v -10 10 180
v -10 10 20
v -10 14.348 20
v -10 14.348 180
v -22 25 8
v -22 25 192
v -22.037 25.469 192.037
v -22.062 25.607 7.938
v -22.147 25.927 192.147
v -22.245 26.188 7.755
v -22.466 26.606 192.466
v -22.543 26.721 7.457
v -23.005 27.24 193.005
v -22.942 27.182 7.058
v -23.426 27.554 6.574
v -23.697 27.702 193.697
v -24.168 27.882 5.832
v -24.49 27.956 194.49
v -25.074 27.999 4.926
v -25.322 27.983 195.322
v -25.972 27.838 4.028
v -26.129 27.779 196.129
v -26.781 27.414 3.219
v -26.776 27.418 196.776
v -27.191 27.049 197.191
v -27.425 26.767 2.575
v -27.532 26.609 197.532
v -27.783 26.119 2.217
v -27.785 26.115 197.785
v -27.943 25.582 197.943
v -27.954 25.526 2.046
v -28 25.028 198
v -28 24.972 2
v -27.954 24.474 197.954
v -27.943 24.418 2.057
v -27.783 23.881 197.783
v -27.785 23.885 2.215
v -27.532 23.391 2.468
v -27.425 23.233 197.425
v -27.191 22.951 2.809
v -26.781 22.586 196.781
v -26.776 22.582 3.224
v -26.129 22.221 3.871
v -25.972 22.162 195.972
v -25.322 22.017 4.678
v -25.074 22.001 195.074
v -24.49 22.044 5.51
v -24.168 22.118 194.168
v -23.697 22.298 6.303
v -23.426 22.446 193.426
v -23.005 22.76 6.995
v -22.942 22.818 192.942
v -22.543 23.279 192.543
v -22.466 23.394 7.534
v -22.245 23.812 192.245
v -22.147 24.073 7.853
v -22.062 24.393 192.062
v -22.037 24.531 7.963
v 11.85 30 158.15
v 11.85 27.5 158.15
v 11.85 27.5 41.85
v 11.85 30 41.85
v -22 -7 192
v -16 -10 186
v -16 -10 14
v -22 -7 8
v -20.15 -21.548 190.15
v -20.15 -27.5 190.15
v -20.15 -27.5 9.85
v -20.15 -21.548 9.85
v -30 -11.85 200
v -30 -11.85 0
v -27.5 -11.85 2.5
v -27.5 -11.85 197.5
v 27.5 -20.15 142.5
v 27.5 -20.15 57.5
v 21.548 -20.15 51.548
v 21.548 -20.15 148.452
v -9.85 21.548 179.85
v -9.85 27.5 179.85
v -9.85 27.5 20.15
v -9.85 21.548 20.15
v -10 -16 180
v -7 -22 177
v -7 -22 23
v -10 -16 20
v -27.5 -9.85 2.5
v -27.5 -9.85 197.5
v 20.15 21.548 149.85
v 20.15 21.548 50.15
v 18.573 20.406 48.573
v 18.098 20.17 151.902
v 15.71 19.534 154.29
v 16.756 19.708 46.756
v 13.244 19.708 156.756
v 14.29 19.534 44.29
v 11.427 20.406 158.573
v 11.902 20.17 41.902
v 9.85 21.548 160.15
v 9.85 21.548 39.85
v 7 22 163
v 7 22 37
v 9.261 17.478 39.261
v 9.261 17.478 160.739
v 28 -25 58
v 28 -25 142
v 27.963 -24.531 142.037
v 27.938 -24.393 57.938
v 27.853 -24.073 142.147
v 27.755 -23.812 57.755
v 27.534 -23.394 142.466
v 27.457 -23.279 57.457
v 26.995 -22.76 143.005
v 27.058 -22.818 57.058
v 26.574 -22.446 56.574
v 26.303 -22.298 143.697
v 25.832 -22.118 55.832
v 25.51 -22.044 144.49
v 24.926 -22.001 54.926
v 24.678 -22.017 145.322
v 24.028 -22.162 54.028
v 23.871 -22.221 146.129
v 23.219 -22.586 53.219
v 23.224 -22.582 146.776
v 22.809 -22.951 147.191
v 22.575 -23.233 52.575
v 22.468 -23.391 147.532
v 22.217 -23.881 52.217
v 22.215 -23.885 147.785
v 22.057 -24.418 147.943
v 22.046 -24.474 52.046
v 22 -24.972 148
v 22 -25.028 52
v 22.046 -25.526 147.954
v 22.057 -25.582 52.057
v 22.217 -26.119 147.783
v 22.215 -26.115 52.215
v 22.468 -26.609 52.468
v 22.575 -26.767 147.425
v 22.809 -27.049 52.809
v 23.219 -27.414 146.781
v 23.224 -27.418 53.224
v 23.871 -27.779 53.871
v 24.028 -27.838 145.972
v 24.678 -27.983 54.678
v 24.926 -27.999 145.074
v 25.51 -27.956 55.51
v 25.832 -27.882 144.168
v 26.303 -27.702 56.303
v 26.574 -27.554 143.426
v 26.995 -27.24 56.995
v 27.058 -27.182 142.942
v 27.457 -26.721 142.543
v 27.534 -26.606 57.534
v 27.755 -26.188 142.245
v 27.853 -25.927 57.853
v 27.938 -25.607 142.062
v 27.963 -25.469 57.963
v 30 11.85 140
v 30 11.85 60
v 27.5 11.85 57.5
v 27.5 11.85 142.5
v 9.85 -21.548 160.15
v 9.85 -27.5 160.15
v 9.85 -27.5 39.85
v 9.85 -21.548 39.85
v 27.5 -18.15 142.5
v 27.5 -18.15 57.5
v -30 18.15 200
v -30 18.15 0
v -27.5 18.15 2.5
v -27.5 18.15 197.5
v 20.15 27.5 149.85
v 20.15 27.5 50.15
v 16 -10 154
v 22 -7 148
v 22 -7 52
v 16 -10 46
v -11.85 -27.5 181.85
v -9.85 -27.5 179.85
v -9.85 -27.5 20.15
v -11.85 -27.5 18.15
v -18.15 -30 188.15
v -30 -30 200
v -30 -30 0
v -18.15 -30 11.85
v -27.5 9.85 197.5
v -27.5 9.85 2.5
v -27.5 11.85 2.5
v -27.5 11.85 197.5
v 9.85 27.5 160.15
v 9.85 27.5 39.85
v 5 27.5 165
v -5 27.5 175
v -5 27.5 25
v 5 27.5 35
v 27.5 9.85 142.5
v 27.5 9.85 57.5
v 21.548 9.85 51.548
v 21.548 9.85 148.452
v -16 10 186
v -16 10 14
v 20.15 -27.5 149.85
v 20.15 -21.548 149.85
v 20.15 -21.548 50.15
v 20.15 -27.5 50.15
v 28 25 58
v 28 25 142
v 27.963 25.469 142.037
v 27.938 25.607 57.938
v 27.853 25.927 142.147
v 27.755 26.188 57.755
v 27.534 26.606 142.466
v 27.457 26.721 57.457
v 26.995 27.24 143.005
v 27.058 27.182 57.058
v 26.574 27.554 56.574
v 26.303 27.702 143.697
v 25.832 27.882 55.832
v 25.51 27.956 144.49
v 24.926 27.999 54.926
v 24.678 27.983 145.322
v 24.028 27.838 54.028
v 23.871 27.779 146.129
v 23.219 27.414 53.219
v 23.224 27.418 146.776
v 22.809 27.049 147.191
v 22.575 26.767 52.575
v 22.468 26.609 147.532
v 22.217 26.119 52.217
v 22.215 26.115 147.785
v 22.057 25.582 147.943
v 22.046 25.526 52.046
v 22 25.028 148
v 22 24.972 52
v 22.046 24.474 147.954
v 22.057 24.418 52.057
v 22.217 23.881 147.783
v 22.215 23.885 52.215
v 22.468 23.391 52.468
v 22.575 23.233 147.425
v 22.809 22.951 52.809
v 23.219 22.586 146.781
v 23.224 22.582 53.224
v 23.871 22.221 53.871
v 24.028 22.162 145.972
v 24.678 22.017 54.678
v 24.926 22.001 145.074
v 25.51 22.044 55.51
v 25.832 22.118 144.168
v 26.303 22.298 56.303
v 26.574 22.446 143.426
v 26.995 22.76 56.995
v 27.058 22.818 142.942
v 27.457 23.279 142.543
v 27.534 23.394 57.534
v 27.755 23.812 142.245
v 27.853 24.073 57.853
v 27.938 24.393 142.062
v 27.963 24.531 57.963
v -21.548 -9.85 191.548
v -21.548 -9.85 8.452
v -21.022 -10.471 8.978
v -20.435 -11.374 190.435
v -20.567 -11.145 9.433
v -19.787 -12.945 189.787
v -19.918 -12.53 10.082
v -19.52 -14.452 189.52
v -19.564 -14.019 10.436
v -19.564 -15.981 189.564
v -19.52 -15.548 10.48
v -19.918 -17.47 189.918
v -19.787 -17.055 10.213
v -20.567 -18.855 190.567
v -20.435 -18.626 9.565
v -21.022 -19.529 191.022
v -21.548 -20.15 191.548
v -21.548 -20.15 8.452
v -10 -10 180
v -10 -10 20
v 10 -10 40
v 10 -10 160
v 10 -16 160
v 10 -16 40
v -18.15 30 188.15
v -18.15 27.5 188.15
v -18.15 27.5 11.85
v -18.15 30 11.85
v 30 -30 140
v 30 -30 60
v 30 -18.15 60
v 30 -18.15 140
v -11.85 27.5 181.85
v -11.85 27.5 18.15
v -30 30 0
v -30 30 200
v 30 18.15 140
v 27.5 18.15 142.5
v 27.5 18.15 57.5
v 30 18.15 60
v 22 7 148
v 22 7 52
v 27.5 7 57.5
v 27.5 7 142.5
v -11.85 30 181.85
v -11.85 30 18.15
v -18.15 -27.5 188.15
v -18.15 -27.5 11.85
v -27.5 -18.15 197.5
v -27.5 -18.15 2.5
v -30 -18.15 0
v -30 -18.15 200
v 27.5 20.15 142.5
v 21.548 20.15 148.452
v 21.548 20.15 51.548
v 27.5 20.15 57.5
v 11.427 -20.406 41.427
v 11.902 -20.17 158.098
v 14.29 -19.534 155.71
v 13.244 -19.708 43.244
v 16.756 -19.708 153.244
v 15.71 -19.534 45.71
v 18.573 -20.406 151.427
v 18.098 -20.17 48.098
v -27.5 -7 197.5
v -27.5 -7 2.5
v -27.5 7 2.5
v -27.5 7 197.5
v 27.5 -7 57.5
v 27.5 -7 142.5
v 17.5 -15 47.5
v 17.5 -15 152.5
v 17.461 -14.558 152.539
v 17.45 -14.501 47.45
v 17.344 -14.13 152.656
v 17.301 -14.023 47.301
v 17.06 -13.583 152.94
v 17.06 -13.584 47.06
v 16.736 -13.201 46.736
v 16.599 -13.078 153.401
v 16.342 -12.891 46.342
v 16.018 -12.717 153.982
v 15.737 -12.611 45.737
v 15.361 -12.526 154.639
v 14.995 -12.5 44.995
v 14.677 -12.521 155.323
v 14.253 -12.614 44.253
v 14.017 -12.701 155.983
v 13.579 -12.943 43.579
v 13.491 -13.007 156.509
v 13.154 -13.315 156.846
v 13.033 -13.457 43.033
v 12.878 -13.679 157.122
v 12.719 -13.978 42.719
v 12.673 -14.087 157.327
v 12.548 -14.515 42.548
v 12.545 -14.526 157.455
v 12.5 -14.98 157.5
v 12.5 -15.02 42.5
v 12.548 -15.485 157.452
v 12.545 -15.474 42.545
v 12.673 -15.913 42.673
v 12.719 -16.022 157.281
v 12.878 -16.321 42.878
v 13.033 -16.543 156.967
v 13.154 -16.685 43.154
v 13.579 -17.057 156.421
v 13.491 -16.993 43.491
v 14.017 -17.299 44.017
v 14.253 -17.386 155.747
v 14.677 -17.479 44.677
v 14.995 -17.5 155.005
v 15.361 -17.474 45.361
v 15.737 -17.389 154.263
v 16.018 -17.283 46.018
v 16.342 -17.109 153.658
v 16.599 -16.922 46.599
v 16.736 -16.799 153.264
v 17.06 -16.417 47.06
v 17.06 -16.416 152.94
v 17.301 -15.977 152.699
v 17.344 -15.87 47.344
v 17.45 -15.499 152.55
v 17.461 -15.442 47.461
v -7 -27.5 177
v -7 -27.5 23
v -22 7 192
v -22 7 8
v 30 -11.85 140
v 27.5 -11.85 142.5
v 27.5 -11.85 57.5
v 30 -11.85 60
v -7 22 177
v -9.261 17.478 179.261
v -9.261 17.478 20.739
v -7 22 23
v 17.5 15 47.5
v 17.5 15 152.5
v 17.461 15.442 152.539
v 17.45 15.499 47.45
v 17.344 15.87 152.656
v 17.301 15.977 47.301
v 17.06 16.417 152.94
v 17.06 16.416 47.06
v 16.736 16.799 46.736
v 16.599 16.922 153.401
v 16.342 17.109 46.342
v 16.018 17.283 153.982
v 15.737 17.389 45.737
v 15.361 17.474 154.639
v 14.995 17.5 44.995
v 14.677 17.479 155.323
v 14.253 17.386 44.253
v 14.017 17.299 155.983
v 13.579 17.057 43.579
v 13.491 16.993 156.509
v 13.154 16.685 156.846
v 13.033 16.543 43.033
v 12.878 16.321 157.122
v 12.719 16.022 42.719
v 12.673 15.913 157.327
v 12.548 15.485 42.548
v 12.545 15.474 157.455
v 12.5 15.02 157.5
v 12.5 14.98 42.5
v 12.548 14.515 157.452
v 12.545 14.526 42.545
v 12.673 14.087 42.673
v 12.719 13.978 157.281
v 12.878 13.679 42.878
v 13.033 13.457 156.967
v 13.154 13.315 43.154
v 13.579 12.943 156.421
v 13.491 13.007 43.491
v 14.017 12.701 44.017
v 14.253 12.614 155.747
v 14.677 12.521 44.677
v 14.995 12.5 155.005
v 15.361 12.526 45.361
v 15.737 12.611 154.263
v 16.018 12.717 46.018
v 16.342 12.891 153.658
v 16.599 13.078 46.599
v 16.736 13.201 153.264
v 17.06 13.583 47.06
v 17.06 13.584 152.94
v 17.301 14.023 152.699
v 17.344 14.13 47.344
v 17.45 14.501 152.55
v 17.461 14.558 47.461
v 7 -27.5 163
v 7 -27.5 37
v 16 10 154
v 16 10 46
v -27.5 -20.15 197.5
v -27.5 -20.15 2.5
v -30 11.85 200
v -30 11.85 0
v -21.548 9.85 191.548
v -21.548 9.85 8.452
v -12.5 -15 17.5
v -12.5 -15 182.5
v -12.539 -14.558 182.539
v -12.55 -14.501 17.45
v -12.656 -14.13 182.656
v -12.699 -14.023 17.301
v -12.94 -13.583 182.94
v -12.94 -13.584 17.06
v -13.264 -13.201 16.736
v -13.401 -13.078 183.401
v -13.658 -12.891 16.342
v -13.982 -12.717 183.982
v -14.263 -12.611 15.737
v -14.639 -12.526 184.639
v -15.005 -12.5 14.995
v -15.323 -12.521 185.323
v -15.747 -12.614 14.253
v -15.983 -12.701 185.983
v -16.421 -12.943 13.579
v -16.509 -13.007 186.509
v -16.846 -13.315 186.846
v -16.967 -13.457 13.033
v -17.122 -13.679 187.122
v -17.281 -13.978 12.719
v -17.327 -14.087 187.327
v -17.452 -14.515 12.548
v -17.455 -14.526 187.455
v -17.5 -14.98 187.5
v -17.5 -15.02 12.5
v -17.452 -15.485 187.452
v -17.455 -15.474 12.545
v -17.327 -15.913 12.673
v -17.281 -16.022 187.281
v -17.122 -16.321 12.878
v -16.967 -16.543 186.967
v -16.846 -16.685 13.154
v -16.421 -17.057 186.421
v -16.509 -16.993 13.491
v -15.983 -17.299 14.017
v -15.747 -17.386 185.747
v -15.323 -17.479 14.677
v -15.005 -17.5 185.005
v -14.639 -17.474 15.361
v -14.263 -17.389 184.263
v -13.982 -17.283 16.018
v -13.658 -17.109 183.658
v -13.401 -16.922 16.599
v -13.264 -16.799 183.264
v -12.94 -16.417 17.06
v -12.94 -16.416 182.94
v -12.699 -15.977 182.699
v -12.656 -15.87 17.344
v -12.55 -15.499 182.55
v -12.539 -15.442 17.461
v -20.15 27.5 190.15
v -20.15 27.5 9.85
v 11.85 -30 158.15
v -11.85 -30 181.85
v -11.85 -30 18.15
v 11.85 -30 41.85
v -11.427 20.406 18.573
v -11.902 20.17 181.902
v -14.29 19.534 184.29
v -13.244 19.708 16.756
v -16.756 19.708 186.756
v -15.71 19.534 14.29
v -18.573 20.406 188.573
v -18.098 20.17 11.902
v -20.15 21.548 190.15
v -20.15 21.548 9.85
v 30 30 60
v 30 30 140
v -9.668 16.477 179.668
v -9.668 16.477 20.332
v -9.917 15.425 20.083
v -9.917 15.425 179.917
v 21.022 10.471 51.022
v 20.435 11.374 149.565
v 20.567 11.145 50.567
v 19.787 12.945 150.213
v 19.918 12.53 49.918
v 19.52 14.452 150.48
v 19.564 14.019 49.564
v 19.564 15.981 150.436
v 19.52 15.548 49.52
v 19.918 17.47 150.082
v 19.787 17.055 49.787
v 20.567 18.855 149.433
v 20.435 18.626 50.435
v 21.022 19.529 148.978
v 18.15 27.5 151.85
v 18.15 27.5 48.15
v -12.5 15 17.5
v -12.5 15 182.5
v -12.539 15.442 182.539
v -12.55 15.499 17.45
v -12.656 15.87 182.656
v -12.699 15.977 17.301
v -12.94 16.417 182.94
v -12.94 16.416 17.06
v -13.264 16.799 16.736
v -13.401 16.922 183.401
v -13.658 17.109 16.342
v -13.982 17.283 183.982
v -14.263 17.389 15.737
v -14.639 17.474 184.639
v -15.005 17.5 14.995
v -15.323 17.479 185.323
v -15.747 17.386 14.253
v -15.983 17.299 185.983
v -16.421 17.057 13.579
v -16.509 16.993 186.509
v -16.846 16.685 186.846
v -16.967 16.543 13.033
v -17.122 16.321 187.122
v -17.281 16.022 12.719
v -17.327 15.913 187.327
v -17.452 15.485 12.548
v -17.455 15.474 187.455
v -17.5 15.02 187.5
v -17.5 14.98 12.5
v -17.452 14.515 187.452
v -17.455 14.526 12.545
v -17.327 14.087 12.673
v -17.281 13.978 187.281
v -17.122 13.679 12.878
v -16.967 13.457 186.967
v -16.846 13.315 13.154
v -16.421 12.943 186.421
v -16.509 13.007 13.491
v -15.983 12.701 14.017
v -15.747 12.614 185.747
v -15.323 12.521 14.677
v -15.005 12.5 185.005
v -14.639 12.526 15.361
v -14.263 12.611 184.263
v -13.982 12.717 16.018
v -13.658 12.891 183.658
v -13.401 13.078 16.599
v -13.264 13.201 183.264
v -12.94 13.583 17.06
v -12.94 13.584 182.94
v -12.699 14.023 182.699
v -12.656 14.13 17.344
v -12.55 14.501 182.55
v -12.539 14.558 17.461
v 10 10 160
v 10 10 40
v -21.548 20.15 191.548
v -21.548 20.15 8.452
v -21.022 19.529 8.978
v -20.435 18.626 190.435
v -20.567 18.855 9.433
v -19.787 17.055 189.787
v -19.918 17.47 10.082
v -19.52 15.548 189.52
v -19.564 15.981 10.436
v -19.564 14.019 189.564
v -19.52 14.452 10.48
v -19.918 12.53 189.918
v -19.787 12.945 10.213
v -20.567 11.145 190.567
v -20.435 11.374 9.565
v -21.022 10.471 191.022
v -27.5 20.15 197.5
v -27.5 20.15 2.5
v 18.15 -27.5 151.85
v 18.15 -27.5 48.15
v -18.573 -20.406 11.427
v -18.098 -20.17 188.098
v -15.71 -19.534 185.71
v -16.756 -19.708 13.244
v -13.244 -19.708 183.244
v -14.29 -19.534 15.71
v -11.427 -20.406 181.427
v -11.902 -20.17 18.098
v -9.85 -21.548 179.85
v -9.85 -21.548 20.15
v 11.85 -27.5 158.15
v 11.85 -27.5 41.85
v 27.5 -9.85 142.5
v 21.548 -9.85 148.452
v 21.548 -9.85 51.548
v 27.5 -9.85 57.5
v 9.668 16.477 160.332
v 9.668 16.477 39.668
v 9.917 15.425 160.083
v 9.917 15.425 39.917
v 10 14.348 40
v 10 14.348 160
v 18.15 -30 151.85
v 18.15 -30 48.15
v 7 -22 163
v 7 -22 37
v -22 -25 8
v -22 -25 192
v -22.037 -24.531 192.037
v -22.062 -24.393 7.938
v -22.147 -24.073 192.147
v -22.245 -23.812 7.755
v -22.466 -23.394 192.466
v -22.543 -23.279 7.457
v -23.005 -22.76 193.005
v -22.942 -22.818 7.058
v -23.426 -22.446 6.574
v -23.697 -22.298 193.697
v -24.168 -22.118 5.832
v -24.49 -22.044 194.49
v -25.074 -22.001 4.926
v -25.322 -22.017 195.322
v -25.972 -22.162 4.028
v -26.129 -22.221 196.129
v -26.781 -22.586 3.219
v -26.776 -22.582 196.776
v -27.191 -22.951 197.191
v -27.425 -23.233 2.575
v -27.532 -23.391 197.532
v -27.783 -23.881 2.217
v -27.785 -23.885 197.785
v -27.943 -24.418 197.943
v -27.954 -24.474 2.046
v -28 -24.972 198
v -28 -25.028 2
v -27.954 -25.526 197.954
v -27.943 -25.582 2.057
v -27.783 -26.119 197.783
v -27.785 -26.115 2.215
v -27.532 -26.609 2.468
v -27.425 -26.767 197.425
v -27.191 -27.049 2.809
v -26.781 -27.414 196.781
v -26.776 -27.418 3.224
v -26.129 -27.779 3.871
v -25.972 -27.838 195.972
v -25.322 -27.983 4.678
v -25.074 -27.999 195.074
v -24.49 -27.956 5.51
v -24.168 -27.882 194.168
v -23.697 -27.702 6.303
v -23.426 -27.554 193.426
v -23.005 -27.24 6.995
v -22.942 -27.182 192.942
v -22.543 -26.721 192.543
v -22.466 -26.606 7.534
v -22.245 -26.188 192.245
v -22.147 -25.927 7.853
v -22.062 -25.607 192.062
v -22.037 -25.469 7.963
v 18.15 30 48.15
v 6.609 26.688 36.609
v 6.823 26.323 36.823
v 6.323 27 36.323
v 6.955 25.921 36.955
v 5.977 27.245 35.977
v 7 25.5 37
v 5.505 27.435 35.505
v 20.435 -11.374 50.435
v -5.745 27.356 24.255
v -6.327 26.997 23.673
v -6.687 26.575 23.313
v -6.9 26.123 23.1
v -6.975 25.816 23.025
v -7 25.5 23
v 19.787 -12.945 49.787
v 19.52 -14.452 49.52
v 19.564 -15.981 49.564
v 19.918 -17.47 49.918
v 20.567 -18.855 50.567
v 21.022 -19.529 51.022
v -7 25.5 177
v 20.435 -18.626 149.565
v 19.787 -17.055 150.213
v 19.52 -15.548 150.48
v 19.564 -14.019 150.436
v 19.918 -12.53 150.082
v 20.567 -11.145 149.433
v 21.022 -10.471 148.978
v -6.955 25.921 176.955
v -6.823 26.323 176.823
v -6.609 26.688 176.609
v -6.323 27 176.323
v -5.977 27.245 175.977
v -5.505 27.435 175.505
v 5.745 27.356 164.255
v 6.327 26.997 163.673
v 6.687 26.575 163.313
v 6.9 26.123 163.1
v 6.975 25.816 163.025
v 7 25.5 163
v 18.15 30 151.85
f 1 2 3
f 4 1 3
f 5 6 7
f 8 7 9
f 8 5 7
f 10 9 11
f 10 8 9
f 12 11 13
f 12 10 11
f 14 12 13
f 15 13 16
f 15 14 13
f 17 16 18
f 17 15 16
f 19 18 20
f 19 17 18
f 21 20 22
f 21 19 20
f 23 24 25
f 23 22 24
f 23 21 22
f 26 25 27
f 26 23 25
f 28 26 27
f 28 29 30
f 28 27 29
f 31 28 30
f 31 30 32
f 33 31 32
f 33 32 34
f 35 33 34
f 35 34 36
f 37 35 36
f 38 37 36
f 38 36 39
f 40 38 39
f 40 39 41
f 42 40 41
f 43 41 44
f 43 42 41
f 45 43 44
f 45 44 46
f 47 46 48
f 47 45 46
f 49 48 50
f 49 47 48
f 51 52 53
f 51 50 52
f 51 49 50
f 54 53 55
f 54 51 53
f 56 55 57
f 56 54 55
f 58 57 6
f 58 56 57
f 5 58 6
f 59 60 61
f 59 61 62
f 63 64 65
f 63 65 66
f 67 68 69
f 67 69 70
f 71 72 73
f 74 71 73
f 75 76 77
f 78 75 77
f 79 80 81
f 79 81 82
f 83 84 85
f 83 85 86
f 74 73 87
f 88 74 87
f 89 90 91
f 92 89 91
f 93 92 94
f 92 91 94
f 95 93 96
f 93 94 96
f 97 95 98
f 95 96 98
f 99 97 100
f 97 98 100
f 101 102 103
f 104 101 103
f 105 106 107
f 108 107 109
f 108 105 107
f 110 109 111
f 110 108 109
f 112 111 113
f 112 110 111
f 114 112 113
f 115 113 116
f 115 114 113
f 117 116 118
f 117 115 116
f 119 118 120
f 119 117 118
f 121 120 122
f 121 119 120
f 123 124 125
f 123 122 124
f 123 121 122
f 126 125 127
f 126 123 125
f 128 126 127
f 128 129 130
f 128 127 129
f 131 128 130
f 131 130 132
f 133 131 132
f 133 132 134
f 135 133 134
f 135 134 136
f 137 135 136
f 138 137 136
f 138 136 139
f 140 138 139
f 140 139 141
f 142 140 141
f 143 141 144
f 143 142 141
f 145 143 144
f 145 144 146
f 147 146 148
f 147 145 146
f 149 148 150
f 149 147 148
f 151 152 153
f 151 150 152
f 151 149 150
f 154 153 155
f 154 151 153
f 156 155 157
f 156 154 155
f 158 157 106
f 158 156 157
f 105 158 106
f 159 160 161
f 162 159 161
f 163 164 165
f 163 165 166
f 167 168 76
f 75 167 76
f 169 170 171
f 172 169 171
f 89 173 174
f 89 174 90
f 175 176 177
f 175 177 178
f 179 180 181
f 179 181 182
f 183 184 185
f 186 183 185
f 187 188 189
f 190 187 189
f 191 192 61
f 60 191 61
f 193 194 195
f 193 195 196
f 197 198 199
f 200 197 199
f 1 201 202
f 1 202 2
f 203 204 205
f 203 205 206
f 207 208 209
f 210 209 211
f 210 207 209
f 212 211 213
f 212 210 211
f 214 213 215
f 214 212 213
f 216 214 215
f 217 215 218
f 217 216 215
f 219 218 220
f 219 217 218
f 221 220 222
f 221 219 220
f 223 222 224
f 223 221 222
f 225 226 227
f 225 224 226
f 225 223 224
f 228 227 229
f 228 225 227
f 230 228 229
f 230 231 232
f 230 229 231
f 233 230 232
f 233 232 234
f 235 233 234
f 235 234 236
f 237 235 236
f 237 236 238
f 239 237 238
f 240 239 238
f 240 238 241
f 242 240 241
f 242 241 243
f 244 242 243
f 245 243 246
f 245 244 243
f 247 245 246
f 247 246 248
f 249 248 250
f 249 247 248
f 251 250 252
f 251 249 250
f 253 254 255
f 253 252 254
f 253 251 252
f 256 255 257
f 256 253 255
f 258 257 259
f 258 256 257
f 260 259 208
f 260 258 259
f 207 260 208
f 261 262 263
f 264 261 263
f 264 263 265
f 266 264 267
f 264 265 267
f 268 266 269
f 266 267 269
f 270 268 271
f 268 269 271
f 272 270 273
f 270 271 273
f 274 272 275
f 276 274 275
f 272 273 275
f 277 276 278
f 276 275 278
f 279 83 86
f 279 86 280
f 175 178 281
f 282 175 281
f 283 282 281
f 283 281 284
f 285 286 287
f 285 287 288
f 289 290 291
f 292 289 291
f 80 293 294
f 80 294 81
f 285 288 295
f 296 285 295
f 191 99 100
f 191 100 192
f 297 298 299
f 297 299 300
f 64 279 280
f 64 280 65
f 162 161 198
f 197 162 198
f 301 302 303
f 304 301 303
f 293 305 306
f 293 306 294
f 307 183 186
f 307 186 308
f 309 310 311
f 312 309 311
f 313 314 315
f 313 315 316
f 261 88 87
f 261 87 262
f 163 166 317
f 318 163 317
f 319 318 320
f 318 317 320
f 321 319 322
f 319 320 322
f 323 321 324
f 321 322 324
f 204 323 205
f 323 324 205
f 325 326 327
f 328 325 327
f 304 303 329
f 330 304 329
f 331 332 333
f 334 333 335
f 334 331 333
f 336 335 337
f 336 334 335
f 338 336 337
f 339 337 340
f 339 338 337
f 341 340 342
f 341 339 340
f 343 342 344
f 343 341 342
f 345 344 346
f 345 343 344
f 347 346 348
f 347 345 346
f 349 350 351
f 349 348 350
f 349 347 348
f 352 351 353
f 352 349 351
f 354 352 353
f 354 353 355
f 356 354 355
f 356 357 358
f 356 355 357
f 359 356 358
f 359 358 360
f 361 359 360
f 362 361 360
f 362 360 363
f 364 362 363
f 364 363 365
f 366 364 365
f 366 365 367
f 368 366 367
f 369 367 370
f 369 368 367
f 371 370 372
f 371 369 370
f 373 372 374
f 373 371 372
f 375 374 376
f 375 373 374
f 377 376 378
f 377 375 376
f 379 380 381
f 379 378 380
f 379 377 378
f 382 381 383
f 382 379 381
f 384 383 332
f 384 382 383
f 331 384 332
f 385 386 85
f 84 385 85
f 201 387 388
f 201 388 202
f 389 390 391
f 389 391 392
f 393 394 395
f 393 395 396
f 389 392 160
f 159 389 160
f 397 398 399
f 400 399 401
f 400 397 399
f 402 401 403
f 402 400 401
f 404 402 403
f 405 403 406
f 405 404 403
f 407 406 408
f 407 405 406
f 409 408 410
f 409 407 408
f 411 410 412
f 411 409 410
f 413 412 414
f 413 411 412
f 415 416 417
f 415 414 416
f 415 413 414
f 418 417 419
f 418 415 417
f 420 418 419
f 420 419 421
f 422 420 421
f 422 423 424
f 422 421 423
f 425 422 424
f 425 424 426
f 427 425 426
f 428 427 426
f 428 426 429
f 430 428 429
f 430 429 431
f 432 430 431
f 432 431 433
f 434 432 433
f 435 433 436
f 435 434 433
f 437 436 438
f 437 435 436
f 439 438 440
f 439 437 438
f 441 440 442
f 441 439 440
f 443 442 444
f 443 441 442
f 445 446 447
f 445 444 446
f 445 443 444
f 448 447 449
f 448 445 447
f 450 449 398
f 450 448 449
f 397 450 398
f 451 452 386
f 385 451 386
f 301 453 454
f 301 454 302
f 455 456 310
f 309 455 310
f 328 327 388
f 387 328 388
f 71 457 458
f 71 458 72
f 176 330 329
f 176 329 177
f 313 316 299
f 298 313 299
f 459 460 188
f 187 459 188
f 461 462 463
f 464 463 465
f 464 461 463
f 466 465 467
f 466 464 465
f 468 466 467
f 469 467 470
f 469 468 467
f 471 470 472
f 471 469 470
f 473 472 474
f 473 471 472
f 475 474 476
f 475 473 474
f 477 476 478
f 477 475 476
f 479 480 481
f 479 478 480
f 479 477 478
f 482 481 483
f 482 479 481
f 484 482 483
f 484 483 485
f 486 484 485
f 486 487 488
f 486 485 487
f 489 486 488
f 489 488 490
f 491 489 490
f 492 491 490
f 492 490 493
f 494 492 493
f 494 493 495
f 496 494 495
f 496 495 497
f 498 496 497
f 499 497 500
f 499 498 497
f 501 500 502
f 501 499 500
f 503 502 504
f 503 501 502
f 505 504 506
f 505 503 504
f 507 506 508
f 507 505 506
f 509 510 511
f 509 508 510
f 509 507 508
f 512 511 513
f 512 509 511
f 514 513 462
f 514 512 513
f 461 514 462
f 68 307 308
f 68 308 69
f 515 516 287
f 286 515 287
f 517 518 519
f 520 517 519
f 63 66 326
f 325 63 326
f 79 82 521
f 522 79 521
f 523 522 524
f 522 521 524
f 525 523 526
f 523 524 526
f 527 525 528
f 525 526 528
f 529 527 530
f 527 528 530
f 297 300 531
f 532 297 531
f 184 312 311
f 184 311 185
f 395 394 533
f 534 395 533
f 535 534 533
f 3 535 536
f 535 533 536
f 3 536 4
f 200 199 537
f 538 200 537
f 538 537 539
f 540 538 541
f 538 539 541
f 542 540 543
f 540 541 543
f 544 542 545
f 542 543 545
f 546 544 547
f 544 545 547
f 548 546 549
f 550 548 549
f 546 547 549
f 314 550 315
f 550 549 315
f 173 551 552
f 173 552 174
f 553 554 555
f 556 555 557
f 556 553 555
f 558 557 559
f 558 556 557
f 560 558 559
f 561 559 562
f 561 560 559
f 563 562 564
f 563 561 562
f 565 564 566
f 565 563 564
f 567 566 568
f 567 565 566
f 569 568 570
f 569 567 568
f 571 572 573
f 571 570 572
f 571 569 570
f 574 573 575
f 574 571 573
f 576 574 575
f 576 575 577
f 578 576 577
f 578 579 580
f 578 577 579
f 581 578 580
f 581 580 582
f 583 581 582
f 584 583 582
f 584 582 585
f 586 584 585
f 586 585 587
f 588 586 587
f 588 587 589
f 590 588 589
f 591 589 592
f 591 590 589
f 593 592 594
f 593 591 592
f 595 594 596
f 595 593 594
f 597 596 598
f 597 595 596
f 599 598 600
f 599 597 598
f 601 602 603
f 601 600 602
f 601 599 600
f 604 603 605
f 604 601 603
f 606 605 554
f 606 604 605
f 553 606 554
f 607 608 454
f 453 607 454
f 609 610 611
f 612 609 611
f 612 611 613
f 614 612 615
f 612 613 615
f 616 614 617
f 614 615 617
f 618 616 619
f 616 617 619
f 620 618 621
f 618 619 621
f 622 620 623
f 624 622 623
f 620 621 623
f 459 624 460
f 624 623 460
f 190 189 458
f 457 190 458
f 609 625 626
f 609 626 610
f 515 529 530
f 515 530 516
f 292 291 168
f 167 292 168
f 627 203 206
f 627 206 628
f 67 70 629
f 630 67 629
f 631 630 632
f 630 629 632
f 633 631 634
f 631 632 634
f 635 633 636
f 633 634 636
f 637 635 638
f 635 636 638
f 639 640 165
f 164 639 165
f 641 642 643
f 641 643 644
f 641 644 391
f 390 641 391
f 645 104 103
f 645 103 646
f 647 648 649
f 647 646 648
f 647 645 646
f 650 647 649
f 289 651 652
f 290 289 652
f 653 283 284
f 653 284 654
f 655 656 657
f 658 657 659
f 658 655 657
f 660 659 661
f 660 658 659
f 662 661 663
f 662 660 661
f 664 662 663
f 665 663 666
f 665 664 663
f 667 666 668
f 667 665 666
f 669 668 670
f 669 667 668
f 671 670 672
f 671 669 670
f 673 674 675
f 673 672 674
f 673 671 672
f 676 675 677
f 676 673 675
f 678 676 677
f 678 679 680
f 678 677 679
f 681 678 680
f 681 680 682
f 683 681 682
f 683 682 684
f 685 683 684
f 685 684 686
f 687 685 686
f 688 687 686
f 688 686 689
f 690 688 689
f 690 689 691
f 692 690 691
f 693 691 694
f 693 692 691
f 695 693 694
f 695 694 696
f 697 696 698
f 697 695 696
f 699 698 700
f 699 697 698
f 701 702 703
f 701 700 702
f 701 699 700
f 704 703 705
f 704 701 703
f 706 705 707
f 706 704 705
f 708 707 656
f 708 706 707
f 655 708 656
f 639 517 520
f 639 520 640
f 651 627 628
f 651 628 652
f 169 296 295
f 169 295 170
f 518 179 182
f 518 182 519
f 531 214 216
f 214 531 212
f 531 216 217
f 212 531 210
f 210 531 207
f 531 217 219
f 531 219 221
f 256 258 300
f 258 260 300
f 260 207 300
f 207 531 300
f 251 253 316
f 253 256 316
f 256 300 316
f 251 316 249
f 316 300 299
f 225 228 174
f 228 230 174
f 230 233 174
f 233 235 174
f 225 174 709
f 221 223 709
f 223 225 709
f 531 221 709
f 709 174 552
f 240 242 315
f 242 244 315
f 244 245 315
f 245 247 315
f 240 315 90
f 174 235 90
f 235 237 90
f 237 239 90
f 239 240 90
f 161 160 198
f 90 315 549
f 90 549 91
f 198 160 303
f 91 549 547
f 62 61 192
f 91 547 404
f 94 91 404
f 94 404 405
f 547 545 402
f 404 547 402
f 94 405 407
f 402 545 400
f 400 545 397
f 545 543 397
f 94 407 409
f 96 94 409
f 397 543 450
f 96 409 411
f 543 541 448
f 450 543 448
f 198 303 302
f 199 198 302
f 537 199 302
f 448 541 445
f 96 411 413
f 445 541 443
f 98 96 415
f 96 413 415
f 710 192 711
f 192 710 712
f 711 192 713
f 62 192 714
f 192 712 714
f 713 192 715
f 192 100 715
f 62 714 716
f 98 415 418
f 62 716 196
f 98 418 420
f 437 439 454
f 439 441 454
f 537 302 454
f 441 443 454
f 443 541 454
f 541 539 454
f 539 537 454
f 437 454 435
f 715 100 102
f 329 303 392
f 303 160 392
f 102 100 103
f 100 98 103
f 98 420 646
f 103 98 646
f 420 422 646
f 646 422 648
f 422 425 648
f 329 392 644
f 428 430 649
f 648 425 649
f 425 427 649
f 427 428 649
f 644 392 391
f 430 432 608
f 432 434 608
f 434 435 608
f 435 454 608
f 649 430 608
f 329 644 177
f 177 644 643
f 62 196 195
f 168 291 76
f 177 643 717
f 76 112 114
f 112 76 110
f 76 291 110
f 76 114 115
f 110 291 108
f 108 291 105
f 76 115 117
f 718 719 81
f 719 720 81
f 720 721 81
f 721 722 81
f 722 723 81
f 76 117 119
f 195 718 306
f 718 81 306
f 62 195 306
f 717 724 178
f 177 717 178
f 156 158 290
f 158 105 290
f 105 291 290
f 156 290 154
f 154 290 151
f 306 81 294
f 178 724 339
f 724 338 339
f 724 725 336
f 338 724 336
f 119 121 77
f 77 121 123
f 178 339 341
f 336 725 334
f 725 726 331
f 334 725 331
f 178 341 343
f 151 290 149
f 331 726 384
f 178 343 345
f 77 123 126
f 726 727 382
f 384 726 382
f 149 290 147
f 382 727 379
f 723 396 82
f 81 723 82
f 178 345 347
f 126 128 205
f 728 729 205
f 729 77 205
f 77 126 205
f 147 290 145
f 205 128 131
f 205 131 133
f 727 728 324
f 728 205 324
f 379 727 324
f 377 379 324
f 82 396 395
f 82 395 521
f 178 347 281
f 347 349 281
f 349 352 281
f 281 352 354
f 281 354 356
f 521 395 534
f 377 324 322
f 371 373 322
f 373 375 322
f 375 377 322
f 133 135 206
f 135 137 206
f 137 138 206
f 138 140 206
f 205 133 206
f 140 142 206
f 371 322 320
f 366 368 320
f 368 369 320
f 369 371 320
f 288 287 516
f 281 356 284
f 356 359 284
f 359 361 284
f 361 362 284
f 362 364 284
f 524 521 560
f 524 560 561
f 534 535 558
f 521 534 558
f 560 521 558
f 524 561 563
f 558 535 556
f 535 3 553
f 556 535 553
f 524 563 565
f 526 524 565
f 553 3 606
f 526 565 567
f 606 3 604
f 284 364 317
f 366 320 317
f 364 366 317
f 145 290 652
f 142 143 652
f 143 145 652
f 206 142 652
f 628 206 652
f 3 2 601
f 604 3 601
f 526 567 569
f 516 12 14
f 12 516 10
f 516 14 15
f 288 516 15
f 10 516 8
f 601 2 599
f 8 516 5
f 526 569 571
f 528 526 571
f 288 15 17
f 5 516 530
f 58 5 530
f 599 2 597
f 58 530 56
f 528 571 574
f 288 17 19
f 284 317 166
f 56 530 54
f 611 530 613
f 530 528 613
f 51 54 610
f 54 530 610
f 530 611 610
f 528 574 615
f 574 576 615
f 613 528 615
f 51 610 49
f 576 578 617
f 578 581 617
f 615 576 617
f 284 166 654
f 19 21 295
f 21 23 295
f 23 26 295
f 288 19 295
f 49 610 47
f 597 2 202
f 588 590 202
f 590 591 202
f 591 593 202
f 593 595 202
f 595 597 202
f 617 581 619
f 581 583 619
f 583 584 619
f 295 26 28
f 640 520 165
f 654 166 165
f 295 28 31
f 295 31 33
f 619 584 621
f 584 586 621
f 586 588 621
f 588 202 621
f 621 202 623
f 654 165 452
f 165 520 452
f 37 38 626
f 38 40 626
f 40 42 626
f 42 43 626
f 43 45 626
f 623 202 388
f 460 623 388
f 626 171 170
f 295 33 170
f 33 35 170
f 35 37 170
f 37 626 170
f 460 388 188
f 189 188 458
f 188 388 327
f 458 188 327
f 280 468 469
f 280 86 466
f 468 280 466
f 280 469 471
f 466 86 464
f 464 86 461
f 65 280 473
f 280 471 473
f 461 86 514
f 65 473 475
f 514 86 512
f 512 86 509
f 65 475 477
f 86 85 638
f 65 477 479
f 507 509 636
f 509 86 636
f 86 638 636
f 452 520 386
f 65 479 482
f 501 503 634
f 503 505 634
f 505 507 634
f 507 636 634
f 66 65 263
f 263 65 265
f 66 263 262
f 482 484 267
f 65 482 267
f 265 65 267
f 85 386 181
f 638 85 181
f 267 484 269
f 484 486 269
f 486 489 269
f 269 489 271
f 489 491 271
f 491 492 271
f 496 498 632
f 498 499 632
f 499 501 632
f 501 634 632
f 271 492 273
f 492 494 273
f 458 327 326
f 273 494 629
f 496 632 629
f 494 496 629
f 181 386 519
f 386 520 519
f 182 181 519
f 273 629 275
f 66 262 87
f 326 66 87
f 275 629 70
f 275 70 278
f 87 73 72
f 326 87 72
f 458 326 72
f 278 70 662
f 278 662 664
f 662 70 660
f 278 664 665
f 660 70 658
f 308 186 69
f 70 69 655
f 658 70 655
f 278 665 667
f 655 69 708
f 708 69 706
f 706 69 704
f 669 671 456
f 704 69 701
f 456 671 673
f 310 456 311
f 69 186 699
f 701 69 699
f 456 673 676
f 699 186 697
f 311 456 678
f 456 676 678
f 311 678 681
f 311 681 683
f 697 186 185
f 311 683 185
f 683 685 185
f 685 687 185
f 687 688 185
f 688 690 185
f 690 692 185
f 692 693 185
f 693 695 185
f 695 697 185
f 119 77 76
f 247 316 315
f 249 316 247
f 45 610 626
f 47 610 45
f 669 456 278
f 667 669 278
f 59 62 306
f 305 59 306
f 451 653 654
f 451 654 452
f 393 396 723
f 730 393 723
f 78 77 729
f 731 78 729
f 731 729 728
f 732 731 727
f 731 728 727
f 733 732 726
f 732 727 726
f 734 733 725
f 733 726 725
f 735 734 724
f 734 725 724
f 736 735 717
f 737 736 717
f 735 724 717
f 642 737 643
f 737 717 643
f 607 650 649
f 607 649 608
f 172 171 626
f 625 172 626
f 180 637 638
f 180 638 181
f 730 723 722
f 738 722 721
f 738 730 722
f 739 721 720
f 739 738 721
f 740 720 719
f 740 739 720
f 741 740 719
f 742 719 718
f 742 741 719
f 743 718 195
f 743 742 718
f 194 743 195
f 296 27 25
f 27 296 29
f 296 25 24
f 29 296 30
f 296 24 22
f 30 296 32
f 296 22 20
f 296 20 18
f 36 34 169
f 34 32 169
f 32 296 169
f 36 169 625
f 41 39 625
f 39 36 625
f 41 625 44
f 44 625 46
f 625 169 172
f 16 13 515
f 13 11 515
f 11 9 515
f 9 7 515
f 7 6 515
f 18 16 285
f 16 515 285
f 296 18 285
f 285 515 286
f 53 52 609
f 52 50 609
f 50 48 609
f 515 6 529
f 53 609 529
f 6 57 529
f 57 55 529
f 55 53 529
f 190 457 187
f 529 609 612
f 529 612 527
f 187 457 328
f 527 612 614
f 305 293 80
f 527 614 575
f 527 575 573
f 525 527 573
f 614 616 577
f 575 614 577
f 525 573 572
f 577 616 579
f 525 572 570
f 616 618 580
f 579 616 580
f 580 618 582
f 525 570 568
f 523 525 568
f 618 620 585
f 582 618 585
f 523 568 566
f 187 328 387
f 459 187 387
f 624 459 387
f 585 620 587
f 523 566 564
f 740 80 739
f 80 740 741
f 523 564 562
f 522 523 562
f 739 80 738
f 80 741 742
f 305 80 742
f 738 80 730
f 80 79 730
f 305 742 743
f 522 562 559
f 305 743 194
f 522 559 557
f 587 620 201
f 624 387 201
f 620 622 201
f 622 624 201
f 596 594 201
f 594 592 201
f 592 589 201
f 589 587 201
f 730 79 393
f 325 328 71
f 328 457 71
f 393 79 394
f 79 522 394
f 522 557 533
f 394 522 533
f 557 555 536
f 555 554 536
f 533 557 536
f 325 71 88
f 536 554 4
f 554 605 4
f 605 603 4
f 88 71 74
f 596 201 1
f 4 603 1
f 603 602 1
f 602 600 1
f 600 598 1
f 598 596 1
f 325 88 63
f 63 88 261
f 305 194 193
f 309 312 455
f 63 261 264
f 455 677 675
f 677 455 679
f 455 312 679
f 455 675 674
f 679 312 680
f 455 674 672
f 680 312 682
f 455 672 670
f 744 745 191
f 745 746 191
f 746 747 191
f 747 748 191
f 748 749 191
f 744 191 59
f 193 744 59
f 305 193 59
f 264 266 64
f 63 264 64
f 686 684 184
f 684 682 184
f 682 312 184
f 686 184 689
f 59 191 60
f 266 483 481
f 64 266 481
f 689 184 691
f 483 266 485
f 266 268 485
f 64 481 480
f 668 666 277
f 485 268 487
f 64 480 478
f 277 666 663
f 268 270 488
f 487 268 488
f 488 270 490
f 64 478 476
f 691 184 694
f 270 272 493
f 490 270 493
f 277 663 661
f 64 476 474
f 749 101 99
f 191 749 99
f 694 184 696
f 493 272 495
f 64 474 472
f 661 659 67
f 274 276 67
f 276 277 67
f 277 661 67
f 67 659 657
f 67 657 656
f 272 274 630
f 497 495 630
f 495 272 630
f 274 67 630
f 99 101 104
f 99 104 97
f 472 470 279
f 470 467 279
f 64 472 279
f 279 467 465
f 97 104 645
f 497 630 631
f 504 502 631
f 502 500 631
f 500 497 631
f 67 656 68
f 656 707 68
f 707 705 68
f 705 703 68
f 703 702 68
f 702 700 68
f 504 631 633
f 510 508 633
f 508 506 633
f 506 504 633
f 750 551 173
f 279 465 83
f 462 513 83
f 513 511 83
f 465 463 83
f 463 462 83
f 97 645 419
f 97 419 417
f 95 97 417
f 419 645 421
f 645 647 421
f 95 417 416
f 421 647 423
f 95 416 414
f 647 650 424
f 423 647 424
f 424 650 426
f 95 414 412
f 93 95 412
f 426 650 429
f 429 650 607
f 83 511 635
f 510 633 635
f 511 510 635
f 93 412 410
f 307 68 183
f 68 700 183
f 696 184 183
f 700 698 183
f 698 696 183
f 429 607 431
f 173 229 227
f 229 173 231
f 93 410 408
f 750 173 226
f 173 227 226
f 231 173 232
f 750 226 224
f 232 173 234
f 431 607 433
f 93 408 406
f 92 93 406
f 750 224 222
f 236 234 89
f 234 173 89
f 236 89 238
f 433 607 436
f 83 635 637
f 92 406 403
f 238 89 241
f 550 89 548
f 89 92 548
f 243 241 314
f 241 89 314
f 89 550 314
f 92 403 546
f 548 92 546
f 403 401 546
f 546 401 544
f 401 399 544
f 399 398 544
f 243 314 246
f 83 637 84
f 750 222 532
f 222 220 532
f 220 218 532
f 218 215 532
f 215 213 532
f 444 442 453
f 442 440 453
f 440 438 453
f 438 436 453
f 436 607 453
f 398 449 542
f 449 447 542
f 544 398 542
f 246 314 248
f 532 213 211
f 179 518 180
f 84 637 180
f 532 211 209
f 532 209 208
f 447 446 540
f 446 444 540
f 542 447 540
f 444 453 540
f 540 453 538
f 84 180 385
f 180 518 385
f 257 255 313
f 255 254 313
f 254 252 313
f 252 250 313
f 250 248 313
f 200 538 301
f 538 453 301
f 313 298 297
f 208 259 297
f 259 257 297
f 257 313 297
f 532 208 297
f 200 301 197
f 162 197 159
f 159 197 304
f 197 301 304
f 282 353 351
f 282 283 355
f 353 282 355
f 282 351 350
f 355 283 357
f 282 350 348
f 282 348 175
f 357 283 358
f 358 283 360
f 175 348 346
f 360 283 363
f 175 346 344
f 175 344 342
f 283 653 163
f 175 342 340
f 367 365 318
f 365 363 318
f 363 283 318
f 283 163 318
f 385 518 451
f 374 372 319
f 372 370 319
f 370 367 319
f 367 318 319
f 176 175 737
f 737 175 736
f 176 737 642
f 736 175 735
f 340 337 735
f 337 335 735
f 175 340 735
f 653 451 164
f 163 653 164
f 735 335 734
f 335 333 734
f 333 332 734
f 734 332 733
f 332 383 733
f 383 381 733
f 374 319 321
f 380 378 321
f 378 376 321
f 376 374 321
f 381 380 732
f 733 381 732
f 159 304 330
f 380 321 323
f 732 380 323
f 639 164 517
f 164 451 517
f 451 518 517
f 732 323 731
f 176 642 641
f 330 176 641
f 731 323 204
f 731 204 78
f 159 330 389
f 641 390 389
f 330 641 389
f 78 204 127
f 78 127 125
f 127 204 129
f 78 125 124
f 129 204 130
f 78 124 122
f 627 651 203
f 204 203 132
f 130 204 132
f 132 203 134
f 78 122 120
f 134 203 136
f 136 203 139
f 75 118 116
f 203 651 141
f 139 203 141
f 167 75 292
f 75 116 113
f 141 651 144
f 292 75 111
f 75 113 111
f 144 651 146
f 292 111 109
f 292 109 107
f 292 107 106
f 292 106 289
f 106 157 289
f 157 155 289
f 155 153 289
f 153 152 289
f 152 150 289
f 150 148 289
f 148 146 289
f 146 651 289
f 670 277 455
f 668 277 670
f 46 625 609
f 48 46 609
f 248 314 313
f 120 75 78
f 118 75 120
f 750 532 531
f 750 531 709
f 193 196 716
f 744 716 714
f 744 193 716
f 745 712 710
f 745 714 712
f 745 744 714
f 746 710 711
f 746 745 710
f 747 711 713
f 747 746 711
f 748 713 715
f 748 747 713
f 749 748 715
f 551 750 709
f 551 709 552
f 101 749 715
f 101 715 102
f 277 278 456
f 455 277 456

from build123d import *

# Parameters (mm, degrees)
F0_R     = 3
F0_R_2   = 2.5
F1_DEPTH = 200
F2_R     = 2
F3_R     = 7
F5_DEPTH = 60


# Not quite as in the source:
# - a feature names something its author has since deleted; it is built from what else it names


with BuildPart() as f1:
    # F0 (on Top) → F1 (new body)
    with BuildSketch(Plane.XY):
        with BuildLine():
            Line((18.15, -30), (30, -30))
            Line((30, -30), (30, -18.15))
            Line((30, -18.15), (27.5, -18.15))
            Line((27.5, -18.15), (27.5, -20.15))
            Line((27.5, -20.15), (21.5477069044, -20.15))
            ThreePointArc((21.5477069044, -20.15), (19.5, -15), (21.5477069044, -9.85))
            Line((21.5477069044, -9.85), (27.5, -9.85))
            Line((27.5, -9.85), (27.5, -11.85))
            Line((27.5, -11.85), (30, -11.85))
            Line((30, -11.85), (30, 11.85))
            Line((30, 11.85), (27.5, 11.85))
            Line((27.5, 11.85), (27.5, 9.85))
            Line((27.5, 9.85), (21.5477069044, 9.85))
            ThreePointArc((21.5477069044, 9.85), (19.5, 15), (21.5477069044, 20.15))
            Line((21.5477069044, 20.15), (27.5, 20.15))
            Line((27.5, 20.15), (27.5, 18.15))
            Line((27.5, 18.15), (30, 18.15))
            Line((30, 18.15), (30, 30))
            Line((30, 30), (18.15, 30))
            Line((18.15, 30), (18.15, 27.5))
            Line((18.15, 27.5), (20.15, 27.5))
            Line((20.15, 27.5), (20.15, 21.5477069044))
            ThreePointArc((20.15, 21.5477069044), (15, 19.5), (9.85, 21.5477069044))
            Line((9.85, 21.5477069044), (9.85, 27.5))
            Line((9.85, 27.5), (11.85, 27.5))
            Line((11.85, 27.5), (11.85, 30))
            Line((11.85, 30), (-11.85, 30))
            Line((-11.85, 30), (-11.85, 27.5))
            Line((-11.85, 27.5), (-9.85, 27.5))
            Line((-9.85, 27.5), (-9.85, 21.5477069044))
            ThreePointArc((-9.85, 21.5477069044), (-15, 19.5), (-20.15, 21.5477069044))
            Line((-20.15, 21.5477069044), (-20.15, 27.5))
            Line((-20.15, 27.5), (-18.15, 27.5))
            Line((-18.15, 27.5), (-18.15, 30))
            Line((-18.15, 30), (-30, 30))
            Line((-30, 30), (-30, 18.15))
            Line((-30, 18.15), (-27.5, 18.15))
            Line((-27.5, 18.15), (-27.5, 20.15))
            Line((-27.5, 20.15), (-21.5477069044, 20.15))
            ThreePointArc((-21.5477069044, 20.15), (-19.5, 15), (-21.5477069044, 9.85))
            Line((-21.5477069044, 9.85), (-27.5, 9.85))
            Line((-27.5, 9.85), (-27.5, 11.85))
            Line((-27.5, 11.85), (-30, 11.85))
            Line((-30, 11.85), (-30, -11.85))
            Line((-30, -11.85), (-27.5, -11.85))
            Line((-27.5, -11.85), (-27.5, -9.85))
            Line((-27.5, -9.85), (-21.5477069044, -9.85))
            ThreePointArc((-21.5477069044, -9.85), (-19.5, -15), (-21.5477069044, -20.15))
            Line((-21.5477069044, -20.15), (-27.5, -20.15))
            Line((-27.5, -20.15), (-27.5, -18.15))
            Line((-27.5, -18.15), (-30, -18.15))
            Line((-30, -18.15), (-30, -30))
            Line((-30, -30), (-18.15, -30))
            Line((-18.15, -30), (-18.15, -27.5))
            Line((-18.15, -27.5), (-20.15, -27.5))
            Line((-20.15, -27.5), (-20.15, -21.5477069044))
            ThreePointArc((-20.15, -21.5477069044), (-15, -19.5), (-9.85, -21.5477069044))
            Line((-9.85, -21.5477069044), (-9.85, -27.5))
            Line((-9.85, -27.5), (-11.85, -27.5))
            Line((-11.85, -27.5), (-11.85, -30))
            Line((-11.85, -30), (11.85, -30))
            Line((11.85, -30), (11.85, -27.5))
            Line((11.85, -27.5), (9.85, -27.5))
            Line((9.85, -27.5), (9.85, -21.5477069044))
            ThreePointArc((9.85, -21.5477069044), (15, -19.5), (20.15, -21.5477069044))
            Line((20.15, -21.5477069044), (20.15, -27.5))
            Line((20.15, -27.5), (18.15, -27.5))
            Line((18.15, -27.5), (18.15, -30))
        make_face()
        with Locations((-25, -25)):
            Circle(F0_R, mode=Mode.SUBTRACT)
        with Locations((-15, -15)):
            Circle(F0_R_2, mode=Mode.SUBTRACT)
        with Locations((25, -25)):
            Circle(F0_R, mode=Mode.SUBTRACT)
        with Locations((15, -15)):
            Circle(F0_R_2, mode=Mode.SUBTRACT)
        with Locations((-25, 25)):
            Circle(F0_R, mode=Mode.SUBTRACT)
        with Locations((-15, 15)):
            Circle(F0_R_2, mode=Mode.SUBTRACT)
        Polygon((-7, 22), (-7, 27.5), (0, 27.5), (7, 27.5), (7, 22), (10, 16), (10, 10), (16, 10), (22, 7), (27.5, 7), (27.5, 0), (27.5, -7), (22, -7), (16, -10), (10, -10), (10, -16), (7, -22), (7, -27.5), (0, -27.5), (-7, -27.5), (-7, -22), (-10, -16), (-10, -10), (-16, -10), (-22, -7), (-27.5, -7), (-27.5, 0), (-27.5, 7), (-22, 7), (-16, 10), (-10, 10), (-10, 16), align=None, mode=Mode.SUBTRACT)
        with Locations((15, 15)):
            Circle(F0_R_2, mode=Mode.SUBTRACT)
        with Locations((25, 25)):
            Circle(F0_R, mode=Mode.SUBTRACT)
    extrude(amount=F1_DEPTH)

    # F2
    f2_edges = [f1.edges().sort_by_distance(p)[0] for p in [
        (-7, 27.5, 100),
        (7, 27.5, 100),
    ]]
    fillet(f2_edges, radius=F2_R)

    # F3
    f3_edges = [f1.edges().sort_by_distance(p)[0] for p in [
        (-10, 16, 100),
        (10, 16, 100),
    ]]
    fillet(f3_edges, radius=F3_R)

    # F4 (on face) → F5 (cut)
    with BuildSketch(Plane.XZ.offset(30)):
        Polygon((30, 0), (30, 60), (-30, 0), (-18.15, 0), align=None)
        Polygon((30, 140), (30, 200), (-18.15, 200), (-30, 200), align=None)
    extrude(amount=-F5_DEPTH, mode=Mode.SUBTRACT)


solid = f1.part
